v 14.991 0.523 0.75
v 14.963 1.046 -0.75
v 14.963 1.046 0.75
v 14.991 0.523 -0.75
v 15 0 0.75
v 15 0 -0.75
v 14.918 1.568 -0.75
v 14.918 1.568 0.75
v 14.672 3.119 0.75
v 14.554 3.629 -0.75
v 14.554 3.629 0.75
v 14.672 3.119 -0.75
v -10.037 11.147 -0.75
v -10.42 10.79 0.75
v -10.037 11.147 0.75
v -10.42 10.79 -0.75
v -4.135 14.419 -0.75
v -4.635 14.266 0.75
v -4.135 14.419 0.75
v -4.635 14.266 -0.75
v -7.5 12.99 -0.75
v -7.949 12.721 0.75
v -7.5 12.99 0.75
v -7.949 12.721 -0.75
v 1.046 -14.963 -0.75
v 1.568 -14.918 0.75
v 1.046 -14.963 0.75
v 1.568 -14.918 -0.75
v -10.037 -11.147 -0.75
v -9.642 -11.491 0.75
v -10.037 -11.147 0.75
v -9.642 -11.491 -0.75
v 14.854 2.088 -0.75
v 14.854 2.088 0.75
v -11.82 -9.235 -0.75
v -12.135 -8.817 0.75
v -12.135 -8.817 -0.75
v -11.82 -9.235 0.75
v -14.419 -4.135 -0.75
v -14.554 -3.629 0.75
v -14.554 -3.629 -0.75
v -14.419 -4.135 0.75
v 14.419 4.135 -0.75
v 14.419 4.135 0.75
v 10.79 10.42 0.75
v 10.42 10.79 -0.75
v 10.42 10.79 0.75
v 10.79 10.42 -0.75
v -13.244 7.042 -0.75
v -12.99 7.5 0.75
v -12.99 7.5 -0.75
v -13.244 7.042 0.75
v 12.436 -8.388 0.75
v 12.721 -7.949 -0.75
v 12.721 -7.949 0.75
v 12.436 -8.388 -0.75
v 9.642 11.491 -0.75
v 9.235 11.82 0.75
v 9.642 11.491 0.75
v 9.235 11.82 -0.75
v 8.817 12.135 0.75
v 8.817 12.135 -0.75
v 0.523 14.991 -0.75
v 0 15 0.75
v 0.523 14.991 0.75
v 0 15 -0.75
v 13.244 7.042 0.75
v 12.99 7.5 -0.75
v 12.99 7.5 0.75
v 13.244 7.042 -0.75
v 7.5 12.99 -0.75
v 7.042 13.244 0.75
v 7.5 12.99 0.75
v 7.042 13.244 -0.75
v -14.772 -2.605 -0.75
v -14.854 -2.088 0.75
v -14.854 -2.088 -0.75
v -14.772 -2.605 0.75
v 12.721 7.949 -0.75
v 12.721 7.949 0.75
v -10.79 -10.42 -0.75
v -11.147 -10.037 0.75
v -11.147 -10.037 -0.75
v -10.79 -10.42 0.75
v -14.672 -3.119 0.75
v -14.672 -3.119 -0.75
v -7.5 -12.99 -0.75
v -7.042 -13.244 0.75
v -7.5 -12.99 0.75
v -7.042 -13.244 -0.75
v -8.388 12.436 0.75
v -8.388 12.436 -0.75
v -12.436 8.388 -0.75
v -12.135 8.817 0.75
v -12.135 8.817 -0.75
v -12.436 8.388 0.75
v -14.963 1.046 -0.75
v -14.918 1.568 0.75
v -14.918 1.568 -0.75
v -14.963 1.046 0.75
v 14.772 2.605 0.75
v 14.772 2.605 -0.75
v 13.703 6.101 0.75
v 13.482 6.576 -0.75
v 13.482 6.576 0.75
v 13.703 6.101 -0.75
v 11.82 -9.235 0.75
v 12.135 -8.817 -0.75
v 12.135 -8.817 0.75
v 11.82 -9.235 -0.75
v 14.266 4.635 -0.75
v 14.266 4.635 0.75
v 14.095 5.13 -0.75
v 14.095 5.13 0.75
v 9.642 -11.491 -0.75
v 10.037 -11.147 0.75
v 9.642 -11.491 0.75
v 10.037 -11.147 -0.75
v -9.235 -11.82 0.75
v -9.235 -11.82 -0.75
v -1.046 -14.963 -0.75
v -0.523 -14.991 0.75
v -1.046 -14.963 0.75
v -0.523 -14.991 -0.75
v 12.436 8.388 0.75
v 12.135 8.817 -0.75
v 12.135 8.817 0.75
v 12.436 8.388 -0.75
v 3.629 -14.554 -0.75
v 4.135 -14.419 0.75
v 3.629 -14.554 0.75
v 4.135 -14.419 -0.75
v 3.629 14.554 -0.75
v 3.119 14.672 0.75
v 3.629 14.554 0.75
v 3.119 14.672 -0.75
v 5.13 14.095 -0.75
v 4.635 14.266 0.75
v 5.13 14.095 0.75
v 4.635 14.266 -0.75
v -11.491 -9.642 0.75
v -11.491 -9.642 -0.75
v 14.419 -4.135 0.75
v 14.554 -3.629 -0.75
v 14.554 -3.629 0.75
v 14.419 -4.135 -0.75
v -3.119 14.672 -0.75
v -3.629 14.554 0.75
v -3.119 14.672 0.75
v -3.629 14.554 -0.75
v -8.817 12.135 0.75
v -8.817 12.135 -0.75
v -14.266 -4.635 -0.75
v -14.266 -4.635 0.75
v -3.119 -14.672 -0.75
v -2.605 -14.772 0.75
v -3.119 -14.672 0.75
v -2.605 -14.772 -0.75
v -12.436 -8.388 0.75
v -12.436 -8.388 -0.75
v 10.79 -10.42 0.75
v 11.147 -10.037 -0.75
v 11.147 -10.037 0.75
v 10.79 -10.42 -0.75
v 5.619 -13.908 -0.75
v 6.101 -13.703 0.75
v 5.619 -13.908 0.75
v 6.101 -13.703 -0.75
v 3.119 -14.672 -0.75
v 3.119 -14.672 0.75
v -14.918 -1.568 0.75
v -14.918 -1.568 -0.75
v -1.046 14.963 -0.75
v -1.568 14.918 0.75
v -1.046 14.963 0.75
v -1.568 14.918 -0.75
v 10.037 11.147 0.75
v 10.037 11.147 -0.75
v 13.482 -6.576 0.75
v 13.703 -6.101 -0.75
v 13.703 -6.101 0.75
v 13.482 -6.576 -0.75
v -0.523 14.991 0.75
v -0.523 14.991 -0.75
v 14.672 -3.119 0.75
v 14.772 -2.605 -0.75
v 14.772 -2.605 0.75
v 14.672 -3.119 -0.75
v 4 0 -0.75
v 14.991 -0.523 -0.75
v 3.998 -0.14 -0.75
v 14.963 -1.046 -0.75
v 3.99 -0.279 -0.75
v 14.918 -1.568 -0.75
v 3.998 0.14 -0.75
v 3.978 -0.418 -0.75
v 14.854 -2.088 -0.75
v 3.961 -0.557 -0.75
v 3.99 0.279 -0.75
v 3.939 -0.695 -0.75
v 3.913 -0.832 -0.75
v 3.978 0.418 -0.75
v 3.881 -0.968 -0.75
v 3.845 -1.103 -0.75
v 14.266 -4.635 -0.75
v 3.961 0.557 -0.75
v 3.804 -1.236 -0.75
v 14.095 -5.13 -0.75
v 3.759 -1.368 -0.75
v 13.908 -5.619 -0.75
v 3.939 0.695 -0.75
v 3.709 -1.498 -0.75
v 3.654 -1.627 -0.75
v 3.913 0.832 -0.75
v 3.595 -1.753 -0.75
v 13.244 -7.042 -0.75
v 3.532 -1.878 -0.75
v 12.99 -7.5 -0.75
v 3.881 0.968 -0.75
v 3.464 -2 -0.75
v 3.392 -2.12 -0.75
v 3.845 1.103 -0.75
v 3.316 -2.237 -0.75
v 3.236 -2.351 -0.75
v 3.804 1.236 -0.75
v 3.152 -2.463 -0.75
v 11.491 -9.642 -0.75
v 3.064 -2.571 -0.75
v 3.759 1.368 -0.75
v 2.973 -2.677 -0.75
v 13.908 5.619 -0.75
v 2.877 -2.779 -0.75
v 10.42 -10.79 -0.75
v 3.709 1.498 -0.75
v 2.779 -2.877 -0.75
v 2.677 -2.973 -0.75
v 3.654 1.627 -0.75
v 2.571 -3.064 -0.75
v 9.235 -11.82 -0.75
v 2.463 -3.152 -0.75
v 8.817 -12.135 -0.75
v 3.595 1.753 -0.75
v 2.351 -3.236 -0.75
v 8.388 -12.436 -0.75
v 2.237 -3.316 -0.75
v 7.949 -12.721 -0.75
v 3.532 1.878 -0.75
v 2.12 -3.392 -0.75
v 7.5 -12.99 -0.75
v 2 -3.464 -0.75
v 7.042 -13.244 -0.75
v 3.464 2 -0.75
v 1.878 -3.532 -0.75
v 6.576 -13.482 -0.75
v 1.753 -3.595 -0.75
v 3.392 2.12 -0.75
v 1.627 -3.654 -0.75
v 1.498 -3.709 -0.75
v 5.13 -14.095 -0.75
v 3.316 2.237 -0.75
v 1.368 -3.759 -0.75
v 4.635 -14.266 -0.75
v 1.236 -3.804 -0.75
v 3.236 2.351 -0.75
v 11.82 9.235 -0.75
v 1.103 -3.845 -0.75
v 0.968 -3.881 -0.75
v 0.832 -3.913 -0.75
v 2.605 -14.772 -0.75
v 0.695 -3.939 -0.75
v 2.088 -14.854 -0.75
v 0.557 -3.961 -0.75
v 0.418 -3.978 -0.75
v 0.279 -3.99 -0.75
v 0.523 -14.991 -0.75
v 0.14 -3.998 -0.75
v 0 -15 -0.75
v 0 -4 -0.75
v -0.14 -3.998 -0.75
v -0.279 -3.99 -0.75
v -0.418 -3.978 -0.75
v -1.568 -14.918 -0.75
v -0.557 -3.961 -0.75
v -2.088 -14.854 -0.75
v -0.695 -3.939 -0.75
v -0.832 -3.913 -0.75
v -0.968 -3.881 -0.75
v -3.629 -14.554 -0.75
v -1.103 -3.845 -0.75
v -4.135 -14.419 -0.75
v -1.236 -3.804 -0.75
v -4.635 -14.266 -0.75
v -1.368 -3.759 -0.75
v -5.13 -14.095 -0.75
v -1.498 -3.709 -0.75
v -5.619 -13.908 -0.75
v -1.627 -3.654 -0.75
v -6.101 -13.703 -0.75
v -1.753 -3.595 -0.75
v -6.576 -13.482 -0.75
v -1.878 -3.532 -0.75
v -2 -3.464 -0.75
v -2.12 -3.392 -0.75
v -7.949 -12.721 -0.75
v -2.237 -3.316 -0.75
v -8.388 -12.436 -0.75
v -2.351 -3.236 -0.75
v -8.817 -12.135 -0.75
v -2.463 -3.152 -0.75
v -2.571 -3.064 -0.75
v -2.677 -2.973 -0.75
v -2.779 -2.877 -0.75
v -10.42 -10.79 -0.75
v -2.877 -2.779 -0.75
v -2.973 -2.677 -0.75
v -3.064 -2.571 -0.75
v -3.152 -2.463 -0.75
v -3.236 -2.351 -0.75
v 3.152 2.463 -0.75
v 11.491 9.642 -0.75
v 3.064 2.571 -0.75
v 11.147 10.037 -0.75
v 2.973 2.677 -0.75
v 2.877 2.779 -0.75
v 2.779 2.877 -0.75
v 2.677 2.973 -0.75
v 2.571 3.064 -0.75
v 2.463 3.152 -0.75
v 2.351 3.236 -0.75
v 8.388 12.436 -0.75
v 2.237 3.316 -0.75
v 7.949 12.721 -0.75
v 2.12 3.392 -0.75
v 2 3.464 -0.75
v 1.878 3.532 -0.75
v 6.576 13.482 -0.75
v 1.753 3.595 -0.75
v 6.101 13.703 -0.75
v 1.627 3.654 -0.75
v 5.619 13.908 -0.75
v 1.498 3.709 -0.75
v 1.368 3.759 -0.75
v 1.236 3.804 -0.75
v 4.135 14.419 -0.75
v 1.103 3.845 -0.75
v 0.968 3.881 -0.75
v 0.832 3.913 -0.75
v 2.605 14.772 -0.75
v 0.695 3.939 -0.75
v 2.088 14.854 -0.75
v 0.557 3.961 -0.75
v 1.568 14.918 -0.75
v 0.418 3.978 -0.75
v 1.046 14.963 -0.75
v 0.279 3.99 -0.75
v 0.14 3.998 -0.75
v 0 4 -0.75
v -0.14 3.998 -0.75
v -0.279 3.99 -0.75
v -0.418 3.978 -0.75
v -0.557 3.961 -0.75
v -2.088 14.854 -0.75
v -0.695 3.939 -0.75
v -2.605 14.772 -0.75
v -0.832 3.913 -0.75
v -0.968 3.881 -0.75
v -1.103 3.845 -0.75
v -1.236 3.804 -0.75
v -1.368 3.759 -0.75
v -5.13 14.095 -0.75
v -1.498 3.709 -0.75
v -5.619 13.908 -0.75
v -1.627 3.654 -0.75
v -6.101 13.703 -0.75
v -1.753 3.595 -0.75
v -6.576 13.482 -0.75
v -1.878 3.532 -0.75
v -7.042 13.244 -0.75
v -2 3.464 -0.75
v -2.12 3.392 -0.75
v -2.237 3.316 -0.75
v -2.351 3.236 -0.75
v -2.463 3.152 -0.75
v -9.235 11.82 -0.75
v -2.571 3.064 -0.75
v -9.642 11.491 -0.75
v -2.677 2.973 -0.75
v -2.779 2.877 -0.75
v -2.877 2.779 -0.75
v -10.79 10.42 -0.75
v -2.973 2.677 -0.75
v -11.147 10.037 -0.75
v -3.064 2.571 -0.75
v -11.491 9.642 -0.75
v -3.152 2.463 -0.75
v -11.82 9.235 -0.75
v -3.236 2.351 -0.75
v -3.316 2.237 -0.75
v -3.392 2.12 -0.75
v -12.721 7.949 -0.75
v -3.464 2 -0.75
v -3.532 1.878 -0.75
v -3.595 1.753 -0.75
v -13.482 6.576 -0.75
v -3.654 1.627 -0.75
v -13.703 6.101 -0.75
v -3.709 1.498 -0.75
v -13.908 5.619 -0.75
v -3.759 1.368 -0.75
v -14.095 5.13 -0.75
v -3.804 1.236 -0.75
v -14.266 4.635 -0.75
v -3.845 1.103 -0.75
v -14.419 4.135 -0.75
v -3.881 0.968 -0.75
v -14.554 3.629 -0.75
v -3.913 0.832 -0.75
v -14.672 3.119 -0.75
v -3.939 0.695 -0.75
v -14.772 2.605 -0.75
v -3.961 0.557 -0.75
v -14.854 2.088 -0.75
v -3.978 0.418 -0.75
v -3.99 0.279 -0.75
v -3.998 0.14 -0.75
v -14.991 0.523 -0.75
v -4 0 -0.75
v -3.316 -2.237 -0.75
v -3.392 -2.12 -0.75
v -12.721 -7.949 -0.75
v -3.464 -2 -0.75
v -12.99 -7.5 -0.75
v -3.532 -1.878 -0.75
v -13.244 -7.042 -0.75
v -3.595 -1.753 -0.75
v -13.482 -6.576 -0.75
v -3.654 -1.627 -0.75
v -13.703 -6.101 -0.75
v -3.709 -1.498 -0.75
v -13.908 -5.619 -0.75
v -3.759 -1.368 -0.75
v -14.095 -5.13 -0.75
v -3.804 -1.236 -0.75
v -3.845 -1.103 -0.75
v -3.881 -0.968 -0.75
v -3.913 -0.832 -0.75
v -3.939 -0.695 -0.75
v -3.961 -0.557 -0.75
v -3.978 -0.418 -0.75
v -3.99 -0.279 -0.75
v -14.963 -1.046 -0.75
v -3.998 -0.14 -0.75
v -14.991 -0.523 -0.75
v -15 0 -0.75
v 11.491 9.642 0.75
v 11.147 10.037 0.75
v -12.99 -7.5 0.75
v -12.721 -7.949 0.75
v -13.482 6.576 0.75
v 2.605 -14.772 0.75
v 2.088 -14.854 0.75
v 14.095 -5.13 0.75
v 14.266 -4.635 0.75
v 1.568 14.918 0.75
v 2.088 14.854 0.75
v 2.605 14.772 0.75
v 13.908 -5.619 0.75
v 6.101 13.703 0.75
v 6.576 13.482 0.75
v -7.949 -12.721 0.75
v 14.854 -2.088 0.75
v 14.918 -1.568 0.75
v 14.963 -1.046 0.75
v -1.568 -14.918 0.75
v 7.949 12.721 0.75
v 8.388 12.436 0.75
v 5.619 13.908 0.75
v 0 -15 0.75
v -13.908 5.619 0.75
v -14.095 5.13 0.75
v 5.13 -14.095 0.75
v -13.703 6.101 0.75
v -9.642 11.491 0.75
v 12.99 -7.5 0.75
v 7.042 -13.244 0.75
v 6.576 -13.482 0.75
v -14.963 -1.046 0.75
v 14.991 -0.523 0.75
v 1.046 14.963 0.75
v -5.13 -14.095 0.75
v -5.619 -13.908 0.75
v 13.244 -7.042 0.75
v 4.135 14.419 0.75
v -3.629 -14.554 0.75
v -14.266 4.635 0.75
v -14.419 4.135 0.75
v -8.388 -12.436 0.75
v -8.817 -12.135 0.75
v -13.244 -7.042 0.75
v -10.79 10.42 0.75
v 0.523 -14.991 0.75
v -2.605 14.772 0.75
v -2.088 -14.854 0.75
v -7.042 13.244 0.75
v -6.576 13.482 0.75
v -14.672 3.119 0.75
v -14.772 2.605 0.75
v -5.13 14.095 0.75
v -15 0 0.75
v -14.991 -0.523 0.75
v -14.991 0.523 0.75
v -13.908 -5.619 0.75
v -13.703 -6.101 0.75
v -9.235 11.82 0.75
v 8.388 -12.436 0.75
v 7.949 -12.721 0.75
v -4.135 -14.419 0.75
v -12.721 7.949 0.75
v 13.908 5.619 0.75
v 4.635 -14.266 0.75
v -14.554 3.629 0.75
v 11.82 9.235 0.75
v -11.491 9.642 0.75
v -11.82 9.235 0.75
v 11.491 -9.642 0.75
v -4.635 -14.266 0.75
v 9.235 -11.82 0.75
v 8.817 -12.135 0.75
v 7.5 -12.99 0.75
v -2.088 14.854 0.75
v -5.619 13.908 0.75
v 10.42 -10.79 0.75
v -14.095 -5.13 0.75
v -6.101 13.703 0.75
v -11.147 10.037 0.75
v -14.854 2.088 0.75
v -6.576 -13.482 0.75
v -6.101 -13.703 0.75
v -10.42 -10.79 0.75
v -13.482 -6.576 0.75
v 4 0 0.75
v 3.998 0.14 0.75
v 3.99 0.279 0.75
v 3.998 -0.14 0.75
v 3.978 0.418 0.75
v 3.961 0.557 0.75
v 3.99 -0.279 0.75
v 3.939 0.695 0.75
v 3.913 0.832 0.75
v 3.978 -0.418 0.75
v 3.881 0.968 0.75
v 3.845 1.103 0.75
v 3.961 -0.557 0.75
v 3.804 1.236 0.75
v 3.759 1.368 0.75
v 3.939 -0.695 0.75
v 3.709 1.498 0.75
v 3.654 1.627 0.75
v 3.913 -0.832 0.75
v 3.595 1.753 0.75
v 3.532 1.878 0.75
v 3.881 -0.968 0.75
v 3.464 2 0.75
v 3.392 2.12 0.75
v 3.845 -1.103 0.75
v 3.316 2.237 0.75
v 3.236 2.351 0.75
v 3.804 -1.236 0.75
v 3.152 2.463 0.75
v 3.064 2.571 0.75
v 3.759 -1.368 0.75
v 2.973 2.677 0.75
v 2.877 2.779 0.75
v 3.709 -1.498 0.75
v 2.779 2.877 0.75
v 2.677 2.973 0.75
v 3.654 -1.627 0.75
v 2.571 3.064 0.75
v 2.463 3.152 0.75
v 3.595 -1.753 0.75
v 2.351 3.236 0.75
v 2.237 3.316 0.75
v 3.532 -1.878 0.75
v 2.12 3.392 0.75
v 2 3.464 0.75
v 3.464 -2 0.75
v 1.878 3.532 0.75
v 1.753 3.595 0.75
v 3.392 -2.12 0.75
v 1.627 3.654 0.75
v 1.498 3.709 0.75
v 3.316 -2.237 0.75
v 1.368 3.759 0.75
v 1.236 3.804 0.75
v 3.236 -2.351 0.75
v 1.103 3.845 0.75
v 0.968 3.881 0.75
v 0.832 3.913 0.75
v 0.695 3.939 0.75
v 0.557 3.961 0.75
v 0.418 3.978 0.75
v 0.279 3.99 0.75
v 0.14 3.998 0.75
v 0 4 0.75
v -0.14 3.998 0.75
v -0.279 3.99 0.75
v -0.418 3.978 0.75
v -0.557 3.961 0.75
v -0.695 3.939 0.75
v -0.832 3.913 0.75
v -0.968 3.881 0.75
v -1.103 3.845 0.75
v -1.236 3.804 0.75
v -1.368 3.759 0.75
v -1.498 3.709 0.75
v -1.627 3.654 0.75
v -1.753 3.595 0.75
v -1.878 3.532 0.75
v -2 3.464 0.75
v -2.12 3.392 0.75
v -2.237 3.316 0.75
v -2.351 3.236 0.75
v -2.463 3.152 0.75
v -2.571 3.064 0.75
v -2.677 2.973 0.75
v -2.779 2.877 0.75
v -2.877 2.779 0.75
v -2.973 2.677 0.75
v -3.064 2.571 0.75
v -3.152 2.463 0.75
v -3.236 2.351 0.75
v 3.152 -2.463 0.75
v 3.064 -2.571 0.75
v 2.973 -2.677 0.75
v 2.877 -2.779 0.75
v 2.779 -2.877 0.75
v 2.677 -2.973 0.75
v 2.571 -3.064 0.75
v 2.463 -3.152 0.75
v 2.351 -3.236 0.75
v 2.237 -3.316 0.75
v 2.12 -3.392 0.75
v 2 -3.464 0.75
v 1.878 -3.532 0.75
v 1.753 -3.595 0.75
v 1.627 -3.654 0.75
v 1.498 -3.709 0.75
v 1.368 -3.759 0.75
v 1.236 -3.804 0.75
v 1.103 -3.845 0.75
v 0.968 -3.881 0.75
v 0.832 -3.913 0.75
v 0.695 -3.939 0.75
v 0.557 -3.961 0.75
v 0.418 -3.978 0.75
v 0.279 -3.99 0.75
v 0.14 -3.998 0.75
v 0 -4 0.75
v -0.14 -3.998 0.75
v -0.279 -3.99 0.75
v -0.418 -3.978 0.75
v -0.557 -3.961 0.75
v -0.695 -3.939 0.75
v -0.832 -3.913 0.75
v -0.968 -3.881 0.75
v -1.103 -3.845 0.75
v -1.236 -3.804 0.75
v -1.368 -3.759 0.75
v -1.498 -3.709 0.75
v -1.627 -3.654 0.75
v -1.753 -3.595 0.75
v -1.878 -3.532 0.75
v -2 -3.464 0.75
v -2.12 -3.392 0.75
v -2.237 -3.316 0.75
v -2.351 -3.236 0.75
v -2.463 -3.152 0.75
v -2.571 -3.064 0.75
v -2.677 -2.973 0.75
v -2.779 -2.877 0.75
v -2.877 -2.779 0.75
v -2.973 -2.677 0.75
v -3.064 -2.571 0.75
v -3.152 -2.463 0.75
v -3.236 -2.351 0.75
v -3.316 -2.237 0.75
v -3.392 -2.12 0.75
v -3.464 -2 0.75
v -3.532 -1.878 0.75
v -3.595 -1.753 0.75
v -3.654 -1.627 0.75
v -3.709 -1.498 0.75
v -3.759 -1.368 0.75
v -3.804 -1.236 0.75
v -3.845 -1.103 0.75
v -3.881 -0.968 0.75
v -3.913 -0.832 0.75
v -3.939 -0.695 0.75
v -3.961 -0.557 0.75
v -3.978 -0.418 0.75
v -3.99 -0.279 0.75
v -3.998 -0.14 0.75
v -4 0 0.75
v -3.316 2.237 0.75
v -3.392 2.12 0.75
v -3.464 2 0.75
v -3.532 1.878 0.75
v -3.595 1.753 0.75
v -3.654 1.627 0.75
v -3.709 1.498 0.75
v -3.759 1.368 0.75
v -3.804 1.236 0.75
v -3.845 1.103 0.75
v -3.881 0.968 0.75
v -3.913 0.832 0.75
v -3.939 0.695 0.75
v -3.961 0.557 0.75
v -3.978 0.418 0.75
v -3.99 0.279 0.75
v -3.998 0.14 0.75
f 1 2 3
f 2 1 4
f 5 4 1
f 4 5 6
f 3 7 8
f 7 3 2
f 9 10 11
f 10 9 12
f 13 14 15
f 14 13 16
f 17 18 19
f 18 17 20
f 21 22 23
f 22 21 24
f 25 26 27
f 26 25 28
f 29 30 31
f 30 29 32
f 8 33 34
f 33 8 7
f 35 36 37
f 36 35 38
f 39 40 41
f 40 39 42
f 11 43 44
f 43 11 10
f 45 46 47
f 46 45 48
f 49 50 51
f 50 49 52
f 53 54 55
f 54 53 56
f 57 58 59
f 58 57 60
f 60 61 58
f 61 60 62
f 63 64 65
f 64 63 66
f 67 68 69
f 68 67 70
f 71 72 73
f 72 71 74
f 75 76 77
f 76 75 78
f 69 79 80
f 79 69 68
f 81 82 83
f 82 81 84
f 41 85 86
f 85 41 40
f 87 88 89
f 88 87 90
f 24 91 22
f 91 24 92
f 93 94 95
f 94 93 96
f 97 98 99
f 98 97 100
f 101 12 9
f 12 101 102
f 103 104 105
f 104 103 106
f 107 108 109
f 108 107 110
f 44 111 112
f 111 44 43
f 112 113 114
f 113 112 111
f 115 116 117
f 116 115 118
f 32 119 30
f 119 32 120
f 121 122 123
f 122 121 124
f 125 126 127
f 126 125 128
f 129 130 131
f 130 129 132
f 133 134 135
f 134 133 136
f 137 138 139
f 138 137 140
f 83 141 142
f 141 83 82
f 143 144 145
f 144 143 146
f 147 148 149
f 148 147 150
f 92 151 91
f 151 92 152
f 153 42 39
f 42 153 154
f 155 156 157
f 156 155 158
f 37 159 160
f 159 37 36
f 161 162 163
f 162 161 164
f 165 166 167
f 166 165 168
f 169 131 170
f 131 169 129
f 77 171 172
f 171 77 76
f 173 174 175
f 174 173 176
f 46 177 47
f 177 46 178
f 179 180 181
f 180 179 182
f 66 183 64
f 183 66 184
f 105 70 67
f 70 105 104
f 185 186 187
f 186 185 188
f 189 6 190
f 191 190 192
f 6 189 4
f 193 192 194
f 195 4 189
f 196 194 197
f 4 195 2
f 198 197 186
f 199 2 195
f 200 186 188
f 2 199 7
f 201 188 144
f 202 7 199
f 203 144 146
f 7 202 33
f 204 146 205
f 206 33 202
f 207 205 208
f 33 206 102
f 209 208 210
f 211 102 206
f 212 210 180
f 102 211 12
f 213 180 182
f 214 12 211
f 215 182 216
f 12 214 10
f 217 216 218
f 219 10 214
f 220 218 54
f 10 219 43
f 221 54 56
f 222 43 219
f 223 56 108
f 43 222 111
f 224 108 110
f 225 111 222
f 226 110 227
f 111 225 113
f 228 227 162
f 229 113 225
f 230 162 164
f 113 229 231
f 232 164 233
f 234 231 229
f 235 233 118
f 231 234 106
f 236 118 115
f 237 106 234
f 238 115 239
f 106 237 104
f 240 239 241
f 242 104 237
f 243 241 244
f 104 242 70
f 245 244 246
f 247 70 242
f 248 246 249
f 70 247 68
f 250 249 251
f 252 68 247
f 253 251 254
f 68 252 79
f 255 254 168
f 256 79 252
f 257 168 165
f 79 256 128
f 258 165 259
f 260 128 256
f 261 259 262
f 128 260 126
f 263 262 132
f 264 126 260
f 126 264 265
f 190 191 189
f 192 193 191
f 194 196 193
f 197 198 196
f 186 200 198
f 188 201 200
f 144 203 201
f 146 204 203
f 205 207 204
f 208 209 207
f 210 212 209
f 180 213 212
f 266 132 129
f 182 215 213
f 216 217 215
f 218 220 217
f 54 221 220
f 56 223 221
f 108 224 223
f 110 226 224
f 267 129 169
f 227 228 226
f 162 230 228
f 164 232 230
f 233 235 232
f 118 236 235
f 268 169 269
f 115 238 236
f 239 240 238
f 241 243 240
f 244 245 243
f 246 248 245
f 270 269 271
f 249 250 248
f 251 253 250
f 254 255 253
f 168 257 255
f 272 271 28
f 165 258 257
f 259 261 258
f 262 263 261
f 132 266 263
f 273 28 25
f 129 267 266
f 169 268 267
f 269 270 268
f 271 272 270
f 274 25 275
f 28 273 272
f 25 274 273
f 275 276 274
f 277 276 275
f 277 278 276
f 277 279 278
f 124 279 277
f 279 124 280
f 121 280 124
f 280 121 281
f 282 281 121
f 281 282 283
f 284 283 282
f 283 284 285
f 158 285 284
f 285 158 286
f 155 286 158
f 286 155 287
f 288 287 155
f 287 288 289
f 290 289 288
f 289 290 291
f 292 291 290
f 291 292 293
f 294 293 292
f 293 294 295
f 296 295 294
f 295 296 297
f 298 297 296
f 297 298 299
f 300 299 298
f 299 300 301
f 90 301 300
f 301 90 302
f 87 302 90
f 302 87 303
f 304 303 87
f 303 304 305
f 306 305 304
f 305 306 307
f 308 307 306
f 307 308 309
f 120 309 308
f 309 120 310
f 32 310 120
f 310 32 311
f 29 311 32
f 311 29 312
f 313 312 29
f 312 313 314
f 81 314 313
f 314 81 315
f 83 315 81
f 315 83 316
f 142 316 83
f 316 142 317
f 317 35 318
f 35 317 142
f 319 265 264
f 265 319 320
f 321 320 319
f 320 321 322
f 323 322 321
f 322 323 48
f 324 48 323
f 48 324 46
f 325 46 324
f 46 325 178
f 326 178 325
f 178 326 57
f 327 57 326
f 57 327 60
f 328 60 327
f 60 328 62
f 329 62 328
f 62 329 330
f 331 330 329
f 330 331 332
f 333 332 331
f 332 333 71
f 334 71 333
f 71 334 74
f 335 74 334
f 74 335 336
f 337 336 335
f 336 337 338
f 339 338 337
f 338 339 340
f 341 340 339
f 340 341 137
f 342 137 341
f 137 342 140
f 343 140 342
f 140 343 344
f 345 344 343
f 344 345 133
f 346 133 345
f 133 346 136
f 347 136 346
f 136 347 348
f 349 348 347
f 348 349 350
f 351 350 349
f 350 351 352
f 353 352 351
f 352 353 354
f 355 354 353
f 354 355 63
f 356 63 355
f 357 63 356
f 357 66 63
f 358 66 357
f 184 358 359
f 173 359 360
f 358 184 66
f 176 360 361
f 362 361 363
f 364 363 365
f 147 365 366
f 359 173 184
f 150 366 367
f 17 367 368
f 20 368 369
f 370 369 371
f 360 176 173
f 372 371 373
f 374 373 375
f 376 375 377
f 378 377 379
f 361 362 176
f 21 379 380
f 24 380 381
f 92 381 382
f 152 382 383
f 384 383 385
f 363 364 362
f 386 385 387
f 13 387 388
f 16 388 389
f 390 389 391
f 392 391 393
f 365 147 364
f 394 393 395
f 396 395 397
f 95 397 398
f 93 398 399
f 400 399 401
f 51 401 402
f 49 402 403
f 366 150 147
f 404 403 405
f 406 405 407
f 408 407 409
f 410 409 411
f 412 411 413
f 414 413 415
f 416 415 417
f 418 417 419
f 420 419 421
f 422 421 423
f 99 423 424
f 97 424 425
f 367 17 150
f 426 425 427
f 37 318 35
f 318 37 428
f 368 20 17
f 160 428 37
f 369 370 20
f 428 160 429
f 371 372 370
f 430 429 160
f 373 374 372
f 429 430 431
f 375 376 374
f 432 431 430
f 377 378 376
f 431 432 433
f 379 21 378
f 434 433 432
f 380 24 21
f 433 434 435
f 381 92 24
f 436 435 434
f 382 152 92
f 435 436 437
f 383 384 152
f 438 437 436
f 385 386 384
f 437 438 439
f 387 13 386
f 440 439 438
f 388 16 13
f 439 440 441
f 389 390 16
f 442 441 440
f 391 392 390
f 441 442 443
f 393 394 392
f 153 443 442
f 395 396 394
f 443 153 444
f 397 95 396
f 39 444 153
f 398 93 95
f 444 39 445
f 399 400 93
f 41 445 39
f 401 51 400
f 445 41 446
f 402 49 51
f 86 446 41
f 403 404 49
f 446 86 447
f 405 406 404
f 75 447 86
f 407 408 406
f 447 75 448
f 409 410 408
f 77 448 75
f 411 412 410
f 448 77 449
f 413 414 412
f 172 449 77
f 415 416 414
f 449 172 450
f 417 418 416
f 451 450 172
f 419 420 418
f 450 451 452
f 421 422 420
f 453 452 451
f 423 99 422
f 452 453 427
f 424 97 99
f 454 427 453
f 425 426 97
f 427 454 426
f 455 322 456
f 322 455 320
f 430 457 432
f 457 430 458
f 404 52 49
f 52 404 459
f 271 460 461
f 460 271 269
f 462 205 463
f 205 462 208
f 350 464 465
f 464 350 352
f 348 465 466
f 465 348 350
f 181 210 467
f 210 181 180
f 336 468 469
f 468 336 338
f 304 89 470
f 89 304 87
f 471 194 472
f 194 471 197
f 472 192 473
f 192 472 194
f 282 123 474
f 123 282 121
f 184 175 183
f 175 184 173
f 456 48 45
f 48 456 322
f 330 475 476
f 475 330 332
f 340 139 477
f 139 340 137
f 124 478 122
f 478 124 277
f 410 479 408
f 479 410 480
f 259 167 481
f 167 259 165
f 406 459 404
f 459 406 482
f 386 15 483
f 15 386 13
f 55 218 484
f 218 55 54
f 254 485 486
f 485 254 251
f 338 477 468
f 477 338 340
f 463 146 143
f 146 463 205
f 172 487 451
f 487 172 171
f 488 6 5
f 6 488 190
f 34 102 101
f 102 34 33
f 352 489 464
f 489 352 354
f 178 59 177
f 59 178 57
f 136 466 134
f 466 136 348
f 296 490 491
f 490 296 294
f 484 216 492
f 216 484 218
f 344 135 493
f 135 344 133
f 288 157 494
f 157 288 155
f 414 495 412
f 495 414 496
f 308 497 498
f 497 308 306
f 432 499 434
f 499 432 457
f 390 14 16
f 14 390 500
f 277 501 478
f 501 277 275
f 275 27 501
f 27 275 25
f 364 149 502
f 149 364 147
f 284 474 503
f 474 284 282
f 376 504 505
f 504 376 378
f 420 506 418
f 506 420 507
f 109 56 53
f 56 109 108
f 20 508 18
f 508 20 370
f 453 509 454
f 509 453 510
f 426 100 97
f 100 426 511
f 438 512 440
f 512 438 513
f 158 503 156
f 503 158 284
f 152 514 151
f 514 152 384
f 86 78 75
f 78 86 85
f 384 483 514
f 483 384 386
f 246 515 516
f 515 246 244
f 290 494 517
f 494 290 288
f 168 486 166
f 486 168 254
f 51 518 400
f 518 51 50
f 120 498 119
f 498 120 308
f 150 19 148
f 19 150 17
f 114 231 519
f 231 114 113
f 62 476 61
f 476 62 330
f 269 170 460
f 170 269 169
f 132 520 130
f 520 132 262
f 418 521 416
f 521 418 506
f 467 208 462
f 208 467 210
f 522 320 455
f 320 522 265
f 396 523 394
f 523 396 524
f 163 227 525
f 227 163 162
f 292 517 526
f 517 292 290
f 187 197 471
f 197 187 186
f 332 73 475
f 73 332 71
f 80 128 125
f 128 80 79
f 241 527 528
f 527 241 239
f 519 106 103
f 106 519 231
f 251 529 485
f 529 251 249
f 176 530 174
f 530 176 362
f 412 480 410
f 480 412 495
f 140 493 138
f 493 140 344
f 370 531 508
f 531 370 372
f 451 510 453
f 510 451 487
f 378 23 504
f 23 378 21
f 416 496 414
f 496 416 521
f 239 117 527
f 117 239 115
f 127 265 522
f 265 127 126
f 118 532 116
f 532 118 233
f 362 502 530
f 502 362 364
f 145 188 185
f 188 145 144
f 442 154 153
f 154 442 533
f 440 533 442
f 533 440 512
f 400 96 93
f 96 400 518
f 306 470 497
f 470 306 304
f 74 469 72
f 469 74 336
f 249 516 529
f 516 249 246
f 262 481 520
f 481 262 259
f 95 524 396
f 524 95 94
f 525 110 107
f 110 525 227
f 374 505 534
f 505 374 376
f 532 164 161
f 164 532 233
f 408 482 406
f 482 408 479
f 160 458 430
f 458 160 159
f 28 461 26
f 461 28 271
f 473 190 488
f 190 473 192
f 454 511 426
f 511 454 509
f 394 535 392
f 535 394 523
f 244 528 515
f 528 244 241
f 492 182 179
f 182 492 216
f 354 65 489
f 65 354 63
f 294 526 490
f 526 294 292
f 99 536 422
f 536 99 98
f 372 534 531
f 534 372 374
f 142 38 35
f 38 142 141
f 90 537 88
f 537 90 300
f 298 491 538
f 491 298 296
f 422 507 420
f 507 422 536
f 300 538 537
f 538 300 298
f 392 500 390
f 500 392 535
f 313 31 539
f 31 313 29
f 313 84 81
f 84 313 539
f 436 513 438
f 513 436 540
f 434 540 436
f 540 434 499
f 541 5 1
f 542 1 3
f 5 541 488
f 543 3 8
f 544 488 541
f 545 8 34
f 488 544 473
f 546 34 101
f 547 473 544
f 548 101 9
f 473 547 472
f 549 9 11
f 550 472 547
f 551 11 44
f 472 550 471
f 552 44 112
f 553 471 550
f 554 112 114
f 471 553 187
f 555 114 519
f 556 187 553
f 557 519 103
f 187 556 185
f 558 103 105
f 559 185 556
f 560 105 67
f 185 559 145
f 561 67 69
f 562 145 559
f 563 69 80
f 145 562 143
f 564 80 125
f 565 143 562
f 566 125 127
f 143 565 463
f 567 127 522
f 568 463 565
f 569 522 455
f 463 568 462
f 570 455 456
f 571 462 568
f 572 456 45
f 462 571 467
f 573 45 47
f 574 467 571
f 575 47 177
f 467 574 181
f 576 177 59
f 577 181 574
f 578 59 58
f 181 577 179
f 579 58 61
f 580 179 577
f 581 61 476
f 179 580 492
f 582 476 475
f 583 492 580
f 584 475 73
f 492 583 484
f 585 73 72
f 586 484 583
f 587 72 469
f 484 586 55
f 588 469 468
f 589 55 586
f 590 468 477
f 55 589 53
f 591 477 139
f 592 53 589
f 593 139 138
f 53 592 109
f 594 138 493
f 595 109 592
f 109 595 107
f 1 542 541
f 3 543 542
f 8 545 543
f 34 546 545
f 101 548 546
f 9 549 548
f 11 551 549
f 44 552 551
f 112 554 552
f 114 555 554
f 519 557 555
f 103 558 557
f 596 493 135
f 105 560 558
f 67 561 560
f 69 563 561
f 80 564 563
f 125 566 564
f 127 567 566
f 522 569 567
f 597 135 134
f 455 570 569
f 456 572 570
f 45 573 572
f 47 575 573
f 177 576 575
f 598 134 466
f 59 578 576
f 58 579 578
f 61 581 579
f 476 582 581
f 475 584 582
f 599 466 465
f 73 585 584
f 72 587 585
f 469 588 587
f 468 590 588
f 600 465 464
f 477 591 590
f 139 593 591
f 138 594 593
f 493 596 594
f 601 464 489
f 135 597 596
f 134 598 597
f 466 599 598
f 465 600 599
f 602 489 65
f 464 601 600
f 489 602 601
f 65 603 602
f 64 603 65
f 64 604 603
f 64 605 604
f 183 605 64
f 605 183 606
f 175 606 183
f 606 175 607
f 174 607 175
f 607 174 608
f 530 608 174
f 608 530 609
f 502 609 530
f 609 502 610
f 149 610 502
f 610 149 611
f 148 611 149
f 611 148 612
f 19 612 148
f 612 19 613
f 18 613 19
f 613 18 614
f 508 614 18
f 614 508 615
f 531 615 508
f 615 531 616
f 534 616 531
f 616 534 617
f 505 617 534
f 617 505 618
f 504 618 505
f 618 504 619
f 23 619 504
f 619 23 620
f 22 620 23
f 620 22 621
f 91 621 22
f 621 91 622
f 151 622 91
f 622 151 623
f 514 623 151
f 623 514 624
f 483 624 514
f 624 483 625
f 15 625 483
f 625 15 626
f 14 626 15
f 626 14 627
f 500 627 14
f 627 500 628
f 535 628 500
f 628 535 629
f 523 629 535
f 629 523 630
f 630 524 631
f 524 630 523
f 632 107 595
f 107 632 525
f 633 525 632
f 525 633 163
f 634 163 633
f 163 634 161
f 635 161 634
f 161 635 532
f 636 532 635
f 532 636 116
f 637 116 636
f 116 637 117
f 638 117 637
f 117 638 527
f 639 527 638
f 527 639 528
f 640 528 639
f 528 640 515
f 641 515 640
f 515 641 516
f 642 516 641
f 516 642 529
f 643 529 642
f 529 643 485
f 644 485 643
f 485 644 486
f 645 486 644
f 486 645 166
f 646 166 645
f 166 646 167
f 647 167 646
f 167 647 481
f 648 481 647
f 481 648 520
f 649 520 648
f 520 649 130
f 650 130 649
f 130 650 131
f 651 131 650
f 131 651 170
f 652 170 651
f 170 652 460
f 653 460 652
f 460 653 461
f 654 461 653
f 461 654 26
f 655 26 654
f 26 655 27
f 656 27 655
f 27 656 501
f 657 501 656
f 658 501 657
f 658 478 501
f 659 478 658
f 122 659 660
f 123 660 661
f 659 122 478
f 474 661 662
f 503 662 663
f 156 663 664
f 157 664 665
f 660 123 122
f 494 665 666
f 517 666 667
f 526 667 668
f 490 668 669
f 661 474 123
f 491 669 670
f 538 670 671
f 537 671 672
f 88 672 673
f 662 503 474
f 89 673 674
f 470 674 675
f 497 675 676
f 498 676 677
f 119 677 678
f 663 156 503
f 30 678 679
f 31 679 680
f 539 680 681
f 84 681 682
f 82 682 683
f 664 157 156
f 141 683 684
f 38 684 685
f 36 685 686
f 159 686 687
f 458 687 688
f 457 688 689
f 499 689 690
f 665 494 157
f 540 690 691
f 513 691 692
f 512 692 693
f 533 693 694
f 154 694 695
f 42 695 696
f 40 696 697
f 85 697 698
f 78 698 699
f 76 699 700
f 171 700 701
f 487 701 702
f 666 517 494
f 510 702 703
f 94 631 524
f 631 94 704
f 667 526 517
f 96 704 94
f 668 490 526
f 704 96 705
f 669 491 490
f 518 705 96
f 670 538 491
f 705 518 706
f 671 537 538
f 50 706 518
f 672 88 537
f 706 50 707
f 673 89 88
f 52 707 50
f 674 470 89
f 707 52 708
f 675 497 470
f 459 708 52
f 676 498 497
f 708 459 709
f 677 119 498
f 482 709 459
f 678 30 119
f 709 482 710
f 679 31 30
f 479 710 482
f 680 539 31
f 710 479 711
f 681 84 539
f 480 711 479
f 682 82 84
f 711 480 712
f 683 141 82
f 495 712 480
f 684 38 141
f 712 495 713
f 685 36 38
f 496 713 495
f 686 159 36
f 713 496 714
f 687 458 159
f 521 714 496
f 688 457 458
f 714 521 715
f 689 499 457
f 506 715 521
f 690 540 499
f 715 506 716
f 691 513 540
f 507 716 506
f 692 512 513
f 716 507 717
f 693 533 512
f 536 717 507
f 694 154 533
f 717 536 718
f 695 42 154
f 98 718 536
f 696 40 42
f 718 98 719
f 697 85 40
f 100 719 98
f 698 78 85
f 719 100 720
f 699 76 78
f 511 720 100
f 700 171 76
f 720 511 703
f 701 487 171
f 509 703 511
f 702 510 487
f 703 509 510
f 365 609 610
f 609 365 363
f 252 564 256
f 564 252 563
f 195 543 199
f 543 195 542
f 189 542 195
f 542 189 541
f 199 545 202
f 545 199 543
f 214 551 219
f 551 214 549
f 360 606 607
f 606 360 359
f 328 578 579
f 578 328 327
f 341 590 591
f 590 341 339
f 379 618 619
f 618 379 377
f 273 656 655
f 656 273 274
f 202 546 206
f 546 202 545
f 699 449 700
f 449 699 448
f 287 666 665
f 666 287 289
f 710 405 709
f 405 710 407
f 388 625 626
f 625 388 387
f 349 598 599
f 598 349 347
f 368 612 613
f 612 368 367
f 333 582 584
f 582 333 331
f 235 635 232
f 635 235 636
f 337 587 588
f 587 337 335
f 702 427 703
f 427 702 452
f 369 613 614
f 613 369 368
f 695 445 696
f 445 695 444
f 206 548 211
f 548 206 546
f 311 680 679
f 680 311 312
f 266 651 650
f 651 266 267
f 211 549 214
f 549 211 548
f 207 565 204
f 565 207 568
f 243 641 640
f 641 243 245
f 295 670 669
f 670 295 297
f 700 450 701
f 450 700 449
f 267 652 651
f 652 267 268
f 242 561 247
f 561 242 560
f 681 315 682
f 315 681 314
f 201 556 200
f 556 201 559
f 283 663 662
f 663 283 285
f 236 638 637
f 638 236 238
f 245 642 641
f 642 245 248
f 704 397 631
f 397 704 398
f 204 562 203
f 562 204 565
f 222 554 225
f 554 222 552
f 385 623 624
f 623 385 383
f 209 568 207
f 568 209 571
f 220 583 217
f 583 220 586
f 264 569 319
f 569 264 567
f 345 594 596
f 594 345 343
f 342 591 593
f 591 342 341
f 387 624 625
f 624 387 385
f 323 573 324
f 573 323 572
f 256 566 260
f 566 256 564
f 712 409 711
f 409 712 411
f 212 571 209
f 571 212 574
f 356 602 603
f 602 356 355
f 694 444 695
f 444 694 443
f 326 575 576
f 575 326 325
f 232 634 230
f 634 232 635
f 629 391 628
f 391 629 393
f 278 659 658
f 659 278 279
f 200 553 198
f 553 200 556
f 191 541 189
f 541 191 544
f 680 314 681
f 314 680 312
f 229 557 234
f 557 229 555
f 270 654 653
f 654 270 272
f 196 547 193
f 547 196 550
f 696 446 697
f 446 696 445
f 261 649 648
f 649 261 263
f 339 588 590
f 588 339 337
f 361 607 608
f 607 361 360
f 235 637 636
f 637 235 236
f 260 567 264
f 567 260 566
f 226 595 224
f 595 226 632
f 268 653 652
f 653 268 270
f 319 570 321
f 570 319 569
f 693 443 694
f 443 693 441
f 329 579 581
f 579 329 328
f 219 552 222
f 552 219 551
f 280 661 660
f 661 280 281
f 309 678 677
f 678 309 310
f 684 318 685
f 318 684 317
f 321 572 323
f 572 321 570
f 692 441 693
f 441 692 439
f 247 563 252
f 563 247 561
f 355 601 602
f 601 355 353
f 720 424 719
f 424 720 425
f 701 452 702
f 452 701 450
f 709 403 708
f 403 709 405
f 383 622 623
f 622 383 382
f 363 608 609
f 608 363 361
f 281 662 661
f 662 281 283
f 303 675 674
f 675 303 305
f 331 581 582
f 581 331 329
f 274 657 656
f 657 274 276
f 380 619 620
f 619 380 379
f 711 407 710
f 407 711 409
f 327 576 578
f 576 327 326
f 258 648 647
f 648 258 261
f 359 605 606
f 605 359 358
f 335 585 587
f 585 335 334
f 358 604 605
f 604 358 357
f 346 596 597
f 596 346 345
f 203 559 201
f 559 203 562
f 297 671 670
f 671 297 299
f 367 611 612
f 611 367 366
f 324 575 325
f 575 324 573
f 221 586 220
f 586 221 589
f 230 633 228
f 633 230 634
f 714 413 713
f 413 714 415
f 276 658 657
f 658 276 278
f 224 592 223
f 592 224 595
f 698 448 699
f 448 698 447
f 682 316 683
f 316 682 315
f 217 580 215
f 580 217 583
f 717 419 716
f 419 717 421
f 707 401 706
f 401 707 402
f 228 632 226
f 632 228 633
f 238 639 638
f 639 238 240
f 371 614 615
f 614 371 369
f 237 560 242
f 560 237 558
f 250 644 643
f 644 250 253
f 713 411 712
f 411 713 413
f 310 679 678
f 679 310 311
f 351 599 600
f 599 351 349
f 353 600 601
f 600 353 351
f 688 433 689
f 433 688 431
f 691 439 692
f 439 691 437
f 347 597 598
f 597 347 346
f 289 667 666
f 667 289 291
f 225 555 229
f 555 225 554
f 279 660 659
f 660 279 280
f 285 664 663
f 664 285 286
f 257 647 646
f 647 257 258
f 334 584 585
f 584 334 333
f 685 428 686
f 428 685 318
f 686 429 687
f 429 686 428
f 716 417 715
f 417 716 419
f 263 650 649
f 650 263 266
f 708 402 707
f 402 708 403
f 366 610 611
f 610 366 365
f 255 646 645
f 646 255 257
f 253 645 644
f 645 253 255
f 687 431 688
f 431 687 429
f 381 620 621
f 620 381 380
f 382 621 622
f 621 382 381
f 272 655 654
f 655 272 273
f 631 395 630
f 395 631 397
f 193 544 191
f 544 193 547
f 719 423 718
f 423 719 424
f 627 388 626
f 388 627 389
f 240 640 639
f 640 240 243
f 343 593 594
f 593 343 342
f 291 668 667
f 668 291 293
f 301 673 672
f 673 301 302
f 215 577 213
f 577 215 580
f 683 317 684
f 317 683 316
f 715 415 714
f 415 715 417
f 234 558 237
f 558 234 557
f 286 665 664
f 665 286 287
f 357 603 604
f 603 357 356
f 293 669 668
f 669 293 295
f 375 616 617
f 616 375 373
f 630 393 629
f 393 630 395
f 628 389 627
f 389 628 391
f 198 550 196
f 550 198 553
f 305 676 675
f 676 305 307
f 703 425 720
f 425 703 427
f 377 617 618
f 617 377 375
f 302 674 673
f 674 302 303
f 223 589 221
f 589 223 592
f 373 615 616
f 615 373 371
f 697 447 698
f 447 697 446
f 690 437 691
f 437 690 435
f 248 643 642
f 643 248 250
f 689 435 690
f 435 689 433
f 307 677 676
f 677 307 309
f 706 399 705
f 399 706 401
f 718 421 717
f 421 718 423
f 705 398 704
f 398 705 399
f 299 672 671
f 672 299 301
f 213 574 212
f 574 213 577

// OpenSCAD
// Penny washer parameters (mm)
inner_diameter_mm = 8.0;   //[4.0:16.0:0.1]
outer_diameter_mm = 30.0;  //[15.0:60.0:0.1]
thickness_mm      = 1.5;   //[0.75:3.0:0.05]

// Small epsilon to guarantee clean through-cut
eps_mm = 0.05; //[0.01:0.5:0.01]

$fn = 180;

// ONE connected solid: a simple penny washer (ring)
module penny_washer(id=inner_diameter_mm, od=outer_diameter_mm, t=thickness_mm) {
    difference() {
        cylinder(d=od, h=t, center=true);
        cylinder(d=id, h=t + 2*eps_mm, center=true);
    }
}

penny_washer();
